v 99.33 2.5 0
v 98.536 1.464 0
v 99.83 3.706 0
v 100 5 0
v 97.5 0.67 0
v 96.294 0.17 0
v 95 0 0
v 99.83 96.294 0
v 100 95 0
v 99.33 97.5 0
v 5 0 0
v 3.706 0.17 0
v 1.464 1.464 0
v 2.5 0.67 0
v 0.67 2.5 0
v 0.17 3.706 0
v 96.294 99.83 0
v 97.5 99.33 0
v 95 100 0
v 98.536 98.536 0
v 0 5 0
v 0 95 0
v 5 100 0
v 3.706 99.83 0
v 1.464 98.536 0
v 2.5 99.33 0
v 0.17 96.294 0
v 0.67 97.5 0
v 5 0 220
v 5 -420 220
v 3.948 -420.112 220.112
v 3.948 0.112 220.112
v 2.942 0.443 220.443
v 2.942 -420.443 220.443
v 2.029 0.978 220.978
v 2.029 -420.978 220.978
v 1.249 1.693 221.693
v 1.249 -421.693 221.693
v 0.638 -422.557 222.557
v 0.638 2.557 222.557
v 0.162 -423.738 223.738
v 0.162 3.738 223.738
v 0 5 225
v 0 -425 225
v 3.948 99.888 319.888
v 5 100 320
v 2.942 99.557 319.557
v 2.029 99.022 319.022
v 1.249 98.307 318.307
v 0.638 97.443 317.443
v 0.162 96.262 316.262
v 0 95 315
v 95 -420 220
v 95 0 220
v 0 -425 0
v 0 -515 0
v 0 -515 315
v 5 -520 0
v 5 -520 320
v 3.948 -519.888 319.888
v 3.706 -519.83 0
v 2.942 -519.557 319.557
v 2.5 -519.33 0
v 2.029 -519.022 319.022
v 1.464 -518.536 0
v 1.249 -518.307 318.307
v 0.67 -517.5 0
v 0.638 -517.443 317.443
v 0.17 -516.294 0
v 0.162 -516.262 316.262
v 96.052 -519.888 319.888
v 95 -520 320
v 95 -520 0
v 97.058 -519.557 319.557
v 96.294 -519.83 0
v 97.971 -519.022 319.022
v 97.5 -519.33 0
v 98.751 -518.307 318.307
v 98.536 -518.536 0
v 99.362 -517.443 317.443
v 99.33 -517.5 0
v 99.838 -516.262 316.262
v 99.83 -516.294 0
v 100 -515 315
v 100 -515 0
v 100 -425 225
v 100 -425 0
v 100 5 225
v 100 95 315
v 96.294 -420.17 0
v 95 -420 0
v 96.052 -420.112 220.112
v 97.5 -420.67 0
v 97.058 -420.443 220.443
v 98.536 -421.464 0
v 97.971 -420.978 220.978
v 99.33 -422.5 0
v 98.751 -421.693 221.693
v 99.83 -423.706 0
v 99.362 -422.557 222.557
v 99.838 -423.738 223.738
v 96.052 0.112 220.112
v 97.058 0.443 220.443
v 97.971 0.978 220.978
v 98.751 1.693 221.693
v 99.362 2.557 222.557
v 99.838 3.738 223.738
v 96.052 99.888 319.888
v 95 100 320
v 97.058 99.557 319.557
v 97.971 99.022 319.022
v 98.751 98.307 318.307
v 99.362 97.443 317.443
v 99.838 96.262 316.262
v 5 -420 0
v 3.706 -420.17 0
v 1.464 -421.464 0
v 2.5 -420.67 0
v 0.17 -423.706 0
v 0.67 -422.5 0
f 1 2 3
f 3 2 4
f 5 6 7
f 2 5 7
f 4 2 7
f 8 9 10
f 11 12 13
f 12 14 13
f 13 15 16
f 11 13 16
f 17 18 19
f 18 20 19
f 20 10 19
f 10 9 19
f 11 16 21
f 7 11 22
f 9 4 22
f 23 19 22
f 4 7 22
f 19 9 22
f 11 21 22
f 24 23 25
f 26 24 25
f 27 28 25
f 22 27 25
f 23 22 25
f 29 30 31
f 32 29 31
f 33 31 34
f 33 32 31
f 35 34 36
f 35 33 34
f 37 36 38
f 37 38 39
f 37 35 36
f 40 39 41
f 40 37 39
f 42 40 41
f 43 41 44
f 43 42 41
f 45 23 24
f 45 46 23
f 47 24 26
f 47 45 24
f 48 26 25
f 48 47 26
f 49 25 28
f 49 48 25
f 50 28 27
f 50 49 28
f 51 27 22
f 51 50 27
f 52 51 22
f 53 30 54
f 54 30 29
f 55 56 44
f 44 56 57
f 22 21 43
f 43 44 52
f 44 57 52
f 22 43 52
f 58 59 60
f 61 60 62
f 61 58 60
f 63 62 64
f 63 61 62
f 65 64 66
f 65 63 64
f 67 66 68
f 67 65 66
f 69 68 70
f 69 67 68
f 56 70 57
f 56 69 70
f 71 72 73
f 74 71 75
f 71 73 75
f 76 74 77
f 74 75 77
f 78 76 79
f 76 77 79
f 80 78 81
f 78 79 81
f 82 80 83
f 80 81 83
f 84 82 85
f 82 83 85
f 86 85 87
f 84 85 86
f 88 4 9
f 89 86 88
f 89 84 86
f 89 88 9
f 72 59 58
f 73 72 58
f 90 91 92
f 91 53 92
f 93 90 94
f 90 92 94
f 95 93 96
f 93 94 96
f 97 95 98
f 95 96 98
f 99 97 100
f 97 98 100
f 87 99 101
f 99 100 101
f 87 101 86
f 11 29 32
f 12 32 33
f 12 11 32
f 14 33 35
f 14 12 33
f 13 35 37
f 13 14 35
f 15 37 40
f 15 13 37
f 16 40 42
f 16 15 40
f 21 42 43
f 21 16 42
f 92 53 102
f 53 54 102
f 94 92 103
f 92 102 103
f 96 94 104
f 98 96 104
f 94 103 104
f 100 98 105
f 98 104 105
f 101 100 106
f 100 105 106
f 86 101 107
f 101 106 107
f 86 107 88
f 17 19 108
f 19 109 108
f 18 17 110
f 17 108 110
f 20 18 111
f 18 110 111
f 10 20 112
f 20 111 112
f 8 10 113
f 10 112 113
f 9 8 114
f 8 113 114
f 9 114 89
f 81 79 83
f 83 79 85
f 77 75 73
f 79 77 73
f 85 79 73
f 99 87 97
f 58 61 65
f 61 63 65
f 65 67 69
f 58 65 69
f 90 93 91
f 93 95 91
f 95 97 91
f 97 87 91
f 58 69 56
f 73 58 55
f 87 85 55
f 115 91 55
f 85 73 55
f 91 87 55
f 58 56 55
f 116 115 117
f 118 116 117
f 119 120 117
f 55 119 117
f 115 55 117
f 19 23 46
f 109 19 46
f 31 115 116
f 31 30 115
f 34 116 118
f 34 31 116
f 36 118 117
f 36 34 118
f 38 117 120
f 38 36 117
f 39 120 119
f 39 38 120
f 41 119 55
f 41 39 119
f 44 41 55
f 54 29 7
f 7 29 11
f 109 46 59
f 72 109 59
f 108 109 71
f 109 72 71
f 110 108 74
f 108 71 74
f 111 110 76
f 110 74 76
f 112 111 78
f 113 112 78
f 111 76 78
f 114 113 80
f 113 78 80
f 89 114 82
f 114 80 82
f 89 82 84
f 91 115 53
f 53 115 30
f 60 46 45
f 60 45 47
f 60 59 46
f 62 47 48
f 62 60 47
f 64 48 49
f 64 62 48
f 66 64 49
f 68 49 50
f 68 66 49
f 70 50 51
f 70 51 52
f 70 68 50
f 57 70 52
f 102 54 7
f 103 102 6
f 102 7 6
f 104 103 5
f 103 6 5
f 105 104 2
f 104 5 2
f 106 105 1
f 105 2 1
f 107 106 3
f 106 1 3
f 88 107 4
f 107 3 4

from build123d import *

# Parameters (mm, degrees)
F1_DEPTH = 100
F2_R     = 5


with BuildPart() as f1:
    # F0 (on Right) → F1 (new body)
    with BuildSketch(Plane.YZ):
        Polygon((0, 220), (0, 0), (100, 0), (100, 320), (-520, 320), (-520, 0), (-420, 0), (-420, 220), align=None)
    extrude(amount=F1_DEPTH)

    # F2
    f2_edges = [f1.edges().sort_by_distance(p)[0] for p in [
        (100, -520, 160),
        (100, -420, 110),
        (100, -210, 220),
        (100, 0, 110),
        (100, 100, 160),
        (0, -520, 160),
        (0, 0, 110),
        (0, -210, 220),
        (0, -420, 110),
        (0, 100, 160),
        (0, -210, 320),
        (100, -210, 320),
    ]]
    fillet(f2_edges, radius=F2_R)


solid = f1.part
